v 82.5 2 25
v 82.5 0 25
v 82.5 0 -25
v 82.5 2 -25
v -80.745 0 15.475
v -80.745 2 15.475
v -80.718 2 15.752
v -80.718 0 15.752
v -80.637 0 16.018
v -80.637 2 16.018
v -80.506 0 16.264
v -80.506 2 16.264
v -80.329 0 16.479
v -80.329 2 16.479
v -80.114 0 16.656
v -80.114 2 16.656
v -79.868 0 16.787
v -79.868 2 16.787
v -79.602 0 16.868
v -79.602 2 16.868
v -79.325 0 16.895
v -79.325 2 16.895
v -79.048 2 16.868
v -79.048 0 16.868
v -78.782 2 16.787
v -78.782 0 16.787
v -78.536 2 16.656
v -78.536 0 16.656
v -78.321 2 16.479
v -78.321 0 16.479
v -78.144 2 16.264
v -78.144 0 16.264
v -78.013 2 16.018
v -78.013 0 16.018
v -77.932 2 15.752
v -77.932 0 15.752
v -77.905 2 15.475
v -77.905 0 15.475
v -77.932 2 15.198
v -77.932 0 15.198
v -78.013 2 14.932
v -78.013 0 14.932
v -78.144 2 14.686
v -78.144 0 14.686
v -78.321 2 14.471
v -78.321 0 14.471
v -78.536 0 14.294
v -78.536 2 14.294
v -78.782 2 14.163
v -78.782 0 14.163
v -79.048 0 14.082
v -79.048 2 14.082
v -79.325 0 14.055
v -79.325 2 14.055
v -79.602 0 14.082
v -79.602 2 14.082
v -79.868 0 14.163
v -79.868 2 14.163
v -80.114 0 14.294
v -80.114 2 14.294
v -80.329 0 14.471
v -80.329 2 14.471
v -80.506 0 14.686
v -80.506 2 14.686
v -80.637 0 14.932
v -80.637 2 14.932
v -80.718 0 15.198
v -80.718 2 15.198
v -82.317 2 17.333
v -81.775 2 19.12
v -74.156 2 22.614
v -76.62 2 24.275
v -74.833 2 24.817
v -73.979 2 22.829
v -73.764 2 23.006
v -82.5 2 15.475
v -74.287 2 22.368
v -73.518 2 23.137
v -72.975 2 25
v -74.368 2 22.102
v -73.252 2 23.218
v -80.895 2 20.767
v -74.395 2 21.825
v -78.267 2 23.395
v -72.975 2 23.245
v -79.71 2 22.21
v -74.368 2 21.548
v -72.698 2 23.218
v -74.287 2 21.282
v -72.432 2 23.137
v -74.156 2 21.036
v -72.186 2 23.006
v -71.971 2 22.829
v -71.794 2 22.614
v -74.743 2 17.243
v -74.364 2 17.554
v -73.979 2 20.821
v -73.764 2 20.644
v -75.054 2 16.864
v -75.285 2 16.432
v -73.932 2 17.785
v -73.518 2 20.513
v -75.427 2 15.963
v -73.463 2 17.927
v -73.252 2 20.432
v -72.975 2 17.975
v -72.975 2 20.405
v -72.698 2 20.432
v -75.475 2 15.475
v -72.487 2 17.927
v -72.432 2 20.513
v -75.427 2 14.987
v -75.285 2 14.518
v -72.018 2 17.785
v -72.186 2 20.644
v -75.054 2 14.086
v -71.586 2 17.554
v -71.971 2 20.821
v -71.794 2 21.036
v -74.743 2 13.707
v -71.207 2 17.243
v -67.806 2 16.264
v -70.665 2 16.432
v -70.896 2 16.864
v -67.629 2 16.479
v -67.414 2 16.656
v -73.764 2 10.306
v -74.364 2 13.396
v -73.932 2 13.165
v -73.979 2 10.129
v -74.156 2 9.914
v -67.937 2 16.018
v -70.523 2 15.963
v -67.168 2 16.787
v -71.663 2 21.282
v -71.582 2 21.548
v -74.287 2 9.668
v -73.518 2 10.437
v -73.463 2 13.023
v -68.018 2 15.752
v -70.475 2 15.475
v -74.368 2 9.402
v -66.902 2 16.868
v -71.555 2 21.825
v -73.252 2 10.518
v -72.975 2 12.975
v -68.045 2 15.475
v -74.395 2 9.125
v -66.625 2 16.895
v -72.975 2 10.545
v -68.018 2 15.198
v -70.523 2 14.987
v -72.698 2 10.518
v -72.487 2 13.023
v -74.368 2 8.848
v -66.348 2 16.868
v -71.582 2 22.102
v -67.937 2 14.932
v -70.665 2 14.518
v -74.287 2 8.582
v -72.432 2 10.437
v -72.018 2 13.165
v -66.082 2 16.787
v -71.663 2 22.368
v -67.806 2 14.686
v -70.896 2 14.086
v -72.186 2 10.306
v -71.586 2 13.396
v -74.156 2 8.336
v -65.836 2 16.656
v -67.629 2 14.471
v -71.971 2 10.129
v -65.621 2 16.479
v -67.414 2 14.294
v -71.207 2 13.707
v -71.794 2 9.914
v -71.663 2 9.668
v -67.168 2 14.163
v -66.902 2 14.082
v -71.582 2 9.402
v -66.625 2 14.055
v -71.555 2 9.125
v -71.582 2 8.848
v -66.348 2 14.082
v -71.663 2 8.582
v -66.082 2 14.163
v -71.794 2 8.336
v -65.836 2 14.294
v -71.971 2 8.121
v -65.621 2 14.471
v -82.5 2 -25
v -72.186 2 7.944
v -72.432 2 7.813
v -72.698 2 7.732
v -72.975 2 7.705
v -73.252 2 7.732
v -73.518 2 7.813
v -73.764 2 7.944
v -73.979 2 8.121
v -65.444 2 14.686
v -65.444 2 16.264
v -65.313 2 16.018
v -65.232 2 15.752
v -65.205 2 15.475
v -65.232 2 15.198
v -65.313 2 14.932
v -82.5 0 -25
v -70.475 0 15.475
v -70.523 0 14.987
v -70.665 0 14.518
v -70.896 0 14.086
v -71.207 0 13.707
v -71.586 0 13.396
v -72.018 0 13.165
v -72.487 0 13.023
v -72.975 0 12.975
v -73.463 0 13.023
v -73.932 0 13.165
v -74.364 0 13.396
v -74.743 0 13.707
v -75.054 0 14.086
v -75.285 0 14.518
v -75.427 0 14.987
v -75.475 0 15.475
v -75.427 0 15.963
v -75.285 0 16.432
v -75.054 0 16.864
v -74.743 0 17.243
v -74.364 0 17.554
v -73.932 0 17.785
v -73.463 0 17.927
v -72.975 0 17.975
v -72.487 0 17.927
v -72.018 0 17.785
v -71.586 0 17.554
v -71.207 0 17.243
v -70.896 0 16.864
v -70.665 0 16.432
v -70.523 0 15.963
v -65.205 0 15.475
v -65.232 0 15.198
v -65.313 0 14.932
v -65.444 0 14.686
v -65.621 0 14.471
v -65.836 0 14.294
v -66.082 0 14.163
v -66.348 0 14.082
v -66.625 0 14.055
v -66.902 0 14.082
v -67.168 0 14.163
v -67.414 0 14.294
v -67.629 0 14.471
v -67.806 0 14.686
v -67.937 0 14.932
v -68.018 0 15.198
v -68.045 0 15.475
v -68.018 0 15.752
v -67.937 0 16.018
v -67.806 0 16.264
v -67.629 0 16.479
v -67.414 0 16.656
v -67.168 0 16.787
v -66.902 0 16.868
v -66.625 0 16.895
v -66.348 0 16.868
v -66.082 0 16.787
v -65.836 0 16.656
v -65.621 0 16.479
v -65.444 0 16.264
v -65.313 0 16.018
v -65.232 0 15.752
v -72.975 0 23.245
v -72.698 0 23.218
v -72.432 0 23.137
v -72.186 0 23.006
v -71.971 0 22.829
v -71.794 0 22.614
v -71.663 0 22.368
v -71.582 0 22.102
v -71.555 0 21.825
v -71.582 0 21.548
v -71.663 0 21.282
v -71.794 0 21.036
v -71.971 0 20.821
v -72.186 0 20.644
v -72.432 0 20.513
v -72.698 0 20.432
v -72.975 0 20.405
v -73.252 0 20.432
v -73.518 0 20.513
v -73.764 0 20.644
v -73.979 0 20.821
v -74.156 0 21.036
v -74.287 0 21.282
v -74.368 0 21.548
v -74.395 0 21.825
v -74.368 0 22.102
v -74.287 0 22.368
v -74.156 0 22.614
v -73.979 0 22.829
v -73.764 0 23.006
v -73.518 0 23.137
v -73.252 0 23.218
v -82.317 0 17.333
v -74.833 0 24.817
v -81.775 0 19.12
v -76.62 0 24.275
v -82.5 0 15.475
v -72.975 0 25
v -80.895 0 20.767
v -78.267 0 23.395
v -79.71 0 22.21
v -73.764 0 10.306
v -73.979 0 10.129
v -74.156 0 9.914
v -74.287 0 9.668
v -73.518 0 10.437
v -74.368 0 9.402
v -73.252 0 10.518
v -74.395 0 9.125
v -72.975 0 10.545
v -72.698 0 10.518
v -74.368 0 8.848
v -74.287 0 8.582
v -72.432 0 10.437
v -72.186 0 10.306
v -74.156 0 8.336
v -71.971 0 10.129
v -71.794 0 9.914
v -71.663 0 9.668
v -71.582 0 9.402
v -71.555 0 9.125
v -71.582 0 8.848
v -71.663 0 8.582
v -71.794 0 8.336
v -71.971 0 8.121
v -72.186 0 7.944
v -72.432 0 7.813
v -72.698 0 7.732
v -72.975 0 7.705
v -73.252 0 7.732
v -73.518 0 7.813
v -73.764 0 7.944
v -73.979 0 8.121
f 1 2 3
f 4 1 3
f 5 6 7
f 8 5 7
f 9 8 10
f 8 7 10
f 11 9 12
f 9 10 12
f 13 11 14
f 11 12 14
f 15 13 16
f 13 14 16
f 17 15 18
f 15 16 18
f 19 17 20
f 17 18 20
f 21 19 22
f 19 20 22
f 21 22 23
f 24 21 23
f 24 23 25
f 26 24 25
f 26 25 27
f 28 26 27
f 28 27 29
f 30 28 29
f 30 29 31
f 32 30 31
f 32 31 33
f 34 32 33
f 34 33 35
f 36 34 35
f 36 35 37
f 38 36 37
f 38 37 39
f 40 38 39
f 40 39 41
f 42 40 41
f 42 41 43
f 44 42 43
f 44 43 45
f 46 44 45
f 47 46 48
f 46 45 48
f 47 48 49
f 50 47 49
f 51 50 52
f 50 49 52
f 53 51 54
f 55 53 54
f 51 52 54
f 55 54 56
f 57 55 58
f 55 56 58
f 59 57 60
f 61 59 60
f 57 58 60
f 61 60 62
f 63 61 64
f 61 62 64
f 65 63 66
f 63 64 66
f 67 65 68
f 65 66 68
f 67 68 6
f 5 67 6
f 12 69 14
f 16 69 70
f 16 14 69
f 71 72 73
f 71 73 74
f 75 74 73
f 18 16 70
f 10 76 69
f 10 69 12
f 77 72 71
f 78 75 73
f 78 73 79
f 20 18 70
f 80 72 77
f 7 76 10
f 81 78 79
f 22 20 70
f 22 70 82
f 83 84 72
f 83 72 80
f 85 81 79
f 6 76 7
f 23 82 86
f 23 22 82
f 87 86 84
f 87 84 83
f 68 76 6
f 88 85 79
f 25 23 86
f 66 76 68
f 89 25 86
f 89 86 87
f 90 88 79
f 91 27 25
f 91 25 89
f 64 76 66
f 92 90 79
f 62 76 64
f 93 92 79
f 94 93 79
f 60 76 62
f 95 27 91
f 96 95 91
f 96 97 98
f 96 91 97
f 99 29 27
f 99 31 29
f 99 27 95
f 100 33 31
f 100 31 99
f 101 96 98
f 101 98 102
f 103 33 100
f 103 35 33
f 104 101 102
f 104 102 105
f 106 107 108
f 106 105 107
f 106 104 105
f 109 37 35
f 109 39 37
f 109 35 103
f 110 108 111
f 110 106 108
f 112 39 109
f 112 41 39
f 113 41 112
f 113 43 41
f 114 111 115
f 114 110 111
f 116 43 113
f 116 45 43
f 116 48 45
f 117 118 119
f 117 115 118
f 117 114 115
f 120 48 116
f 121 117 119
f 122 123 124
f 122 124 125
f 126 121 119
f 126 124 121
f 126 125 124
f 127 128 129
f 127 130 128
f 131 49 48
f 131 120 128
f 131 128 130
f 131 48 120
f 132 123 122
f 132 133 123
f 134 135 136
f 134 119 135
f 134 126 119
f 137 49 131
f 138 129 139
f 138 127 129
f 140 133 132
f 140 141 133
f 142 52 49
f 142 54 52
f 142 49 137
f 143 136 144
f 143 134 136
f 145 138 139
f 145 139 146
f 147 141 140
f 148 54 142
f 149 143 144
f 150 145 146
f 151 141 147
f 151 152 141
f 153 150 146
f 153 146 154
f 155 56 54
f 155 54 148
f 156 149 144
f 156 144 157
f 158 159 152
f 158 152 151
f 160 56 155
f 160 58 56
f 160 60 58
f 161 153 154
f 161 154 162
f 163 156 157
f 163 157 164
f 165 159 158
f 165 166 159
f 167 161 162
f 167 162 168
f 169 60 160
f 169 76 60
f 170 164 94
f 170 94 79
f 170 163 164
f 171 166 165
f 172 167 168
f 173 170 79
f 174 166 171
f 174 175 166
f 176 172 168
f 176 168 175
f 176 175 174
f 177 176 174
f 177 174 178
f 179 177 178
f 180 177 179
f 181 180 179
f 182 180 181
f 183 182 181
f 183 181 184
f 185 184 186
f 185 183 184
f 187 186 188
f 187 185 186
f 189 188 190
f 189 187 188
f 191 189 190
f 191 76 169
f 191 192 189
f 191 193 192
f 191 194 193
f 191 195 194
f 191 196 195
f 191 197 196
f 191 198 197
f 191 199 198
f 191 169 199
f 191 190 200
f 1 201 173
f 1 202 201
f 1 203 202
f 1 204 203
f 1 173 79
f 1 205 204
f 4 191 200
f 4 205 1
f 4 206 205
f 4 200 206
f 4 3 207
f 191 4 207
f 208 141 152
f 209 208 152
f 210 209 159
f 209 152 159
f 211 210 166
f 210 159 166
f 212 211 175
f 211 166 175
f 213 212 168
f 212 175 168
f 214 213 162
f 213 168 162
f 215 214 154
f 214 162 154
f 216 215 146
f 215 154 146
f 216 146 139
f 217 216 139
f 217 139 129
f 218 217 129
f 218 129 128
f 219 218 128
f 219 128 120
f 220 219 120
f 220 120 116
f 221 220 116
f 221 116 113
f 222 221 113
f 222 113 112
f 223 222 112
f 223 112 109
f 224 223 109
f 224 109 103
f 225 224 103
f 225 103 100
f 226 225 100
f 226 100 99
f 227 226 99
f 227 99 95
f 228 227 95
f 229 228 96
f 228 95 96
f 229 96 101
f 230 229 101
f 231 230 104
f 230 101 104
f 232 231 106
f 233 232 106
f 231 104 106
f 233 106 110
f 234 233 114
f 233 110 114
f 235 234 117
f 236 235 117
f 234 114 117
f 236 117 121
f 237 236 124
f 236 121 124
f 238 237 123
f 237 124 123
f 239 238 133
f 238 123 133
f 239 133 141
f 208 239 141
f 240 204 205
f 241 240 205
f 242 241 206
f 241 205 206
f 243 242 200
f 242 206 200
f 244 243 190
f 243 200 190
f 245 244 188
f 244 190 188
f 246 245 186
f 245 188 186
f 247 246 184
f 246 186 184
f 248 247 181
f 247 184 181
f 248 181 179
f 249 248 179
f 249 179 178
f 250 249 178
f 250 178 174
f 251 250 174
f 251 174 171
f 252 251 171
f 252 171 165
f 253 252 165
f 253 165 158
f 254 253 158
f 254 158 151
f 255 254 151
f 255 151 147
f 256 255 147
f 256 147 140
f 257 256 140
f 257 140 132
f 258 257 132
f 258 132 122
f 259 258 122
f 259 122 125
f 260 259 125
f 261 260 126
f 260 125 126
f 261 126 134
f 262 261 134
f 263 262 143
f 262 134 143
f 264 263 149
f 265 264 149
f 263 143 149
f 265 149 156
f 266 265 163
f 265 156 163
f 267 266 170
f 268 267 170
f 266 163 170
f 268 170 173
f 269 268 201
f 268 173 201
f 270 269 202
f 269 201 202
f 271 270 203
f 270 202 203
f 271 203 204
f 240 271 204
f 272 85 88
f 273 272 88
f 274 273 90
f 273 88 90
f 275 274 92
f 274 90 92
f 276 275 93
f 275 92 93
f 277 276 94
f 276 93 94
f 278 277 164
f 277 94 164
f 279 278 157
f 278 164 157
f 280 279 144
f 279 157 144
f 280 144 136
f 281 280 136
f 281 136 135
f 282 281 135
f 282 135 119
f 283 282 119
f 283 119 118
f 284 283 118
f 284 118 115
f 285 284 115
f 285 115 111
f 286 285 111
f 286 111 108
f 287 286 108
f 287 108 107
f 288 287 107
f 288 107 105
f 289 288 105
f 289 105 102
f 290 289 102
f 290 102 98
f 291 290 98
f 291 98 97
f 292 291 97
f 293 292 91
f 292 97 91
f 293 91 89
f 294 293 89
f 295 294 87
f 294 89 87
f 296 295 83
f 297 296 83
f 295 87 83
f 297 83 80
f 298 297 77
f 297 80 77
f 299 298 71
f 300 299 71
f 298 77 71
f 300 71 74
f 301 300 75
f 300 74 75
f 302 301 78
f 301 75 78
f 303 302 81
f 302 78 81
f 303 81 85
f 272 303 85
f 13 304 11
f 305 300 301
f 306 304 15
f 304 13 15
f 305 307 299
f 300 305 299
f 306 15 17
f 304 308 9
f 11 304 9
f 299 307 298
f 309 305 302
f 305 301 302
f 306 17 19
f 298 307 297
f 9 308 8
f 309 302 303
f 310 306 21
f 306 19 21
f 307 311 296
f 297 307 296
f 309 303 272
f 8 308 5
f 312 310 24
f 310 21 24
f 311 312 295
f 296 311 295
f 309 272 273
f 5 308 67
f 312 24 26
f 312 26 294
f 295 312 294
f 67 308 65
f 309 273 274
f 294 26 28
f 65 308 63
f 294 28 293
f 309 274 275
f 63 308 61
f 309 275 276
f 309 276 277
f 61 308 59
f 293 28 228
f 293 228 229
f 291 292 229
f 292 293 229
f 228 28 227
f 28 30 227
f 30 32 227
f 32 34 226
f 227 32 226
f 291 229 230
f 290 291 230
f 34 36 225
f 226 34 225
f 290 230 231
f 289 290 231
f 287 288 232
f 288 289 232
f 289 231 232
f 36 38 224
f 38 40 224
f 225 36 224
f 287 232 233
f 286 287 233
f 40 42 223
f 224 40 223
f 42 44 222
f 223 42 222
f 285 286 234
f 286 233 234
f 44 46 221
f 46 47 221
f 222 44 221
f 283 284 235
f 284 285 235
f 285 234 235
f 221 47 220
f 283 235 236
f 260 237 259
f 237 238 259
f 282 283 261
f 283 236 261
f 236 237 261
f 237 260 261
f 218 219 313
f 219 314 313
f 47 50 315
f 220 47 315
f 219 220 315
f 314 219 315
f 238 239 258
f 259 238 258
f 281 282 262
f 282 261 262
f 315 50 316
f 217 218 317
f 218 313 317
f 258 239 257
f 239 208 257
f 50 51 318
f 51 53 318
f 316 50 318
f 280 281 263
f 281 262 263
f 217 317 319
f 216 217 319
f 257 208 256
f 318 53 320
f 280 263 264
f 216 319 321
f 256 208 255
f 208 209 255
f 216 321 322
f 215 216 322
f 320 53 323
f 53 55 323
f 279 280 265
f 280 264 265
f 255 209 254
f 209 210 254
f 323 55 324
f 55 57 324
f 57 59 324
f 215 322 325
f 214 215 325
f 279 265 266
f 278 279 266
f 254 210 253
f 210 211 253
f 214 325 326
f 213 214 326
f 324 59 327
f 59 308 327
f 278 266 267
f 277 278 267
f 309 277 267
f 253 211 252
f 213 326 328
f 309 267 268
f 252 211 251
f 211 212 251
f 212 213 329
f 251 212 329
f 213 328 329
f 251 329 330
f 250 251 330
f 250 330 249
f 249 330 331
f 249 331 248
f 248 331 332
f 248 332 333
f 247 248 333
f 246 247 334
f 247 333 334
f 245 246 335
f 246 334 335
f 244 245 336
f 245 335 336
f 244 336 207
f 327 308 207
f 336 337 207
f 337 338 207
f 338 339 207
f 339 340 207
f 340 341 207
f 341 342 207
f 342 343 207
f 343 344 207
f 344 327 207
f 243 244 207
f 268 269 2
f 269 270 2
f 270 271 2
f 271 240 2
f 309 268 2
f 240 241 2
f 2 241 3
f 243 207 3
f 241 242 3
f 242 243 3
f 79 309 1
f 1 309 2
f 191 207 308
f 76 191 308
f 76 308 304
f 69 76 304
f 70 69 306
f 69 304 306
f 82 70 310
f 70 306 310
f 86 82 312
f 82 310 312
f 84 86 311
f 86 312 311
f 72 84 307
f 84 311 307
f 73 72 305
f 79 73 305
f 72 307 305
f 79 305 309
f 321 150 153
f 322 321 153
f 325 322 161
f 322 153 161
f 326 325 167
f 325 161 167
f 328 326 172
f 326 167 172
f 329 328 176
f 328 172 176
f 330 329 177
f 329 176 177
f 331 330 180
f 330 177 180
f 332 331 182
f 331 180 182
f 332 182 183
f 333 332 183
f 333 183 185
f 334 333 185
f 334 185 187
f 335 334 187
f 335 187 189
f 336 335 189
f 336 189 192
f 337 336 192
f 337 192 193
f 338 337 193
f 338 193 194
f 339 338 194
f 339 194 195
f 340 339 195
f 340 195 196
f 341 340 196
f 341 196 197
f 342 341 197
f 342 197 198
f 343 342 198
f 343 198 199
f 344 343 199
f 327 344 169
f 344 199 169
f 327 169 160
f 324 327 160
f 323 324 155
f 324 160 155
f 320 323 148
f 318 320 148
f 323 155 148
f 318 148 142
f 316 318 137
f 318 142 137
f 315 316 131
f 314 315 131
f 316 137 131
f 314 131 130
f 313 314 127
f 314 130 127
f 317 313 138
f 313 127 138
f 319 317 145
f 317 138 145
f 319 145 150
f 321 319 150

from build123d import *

# Parameters (mm, degrees)
BOSS_EXTRUDE1_DEPTH = 2
SKETCH2_R           = 1.42
CUT_EXTRUDE2_DEPTH  = 6.35


with BuildPart() as part:
    # Sketch1 → Boss-Extrude1 (new body)
    with BuildSketch(Plane(origin=(0, 0, 0), x_dir=(1, 0, 0), z_dir=(0, 1, 0))):
        with BuildLine():
            Line((-82.5, 25), (-82.5, -15.475))
            ThreePointArc((-82.5, -15.475), (-79.710192091, -22.210192091), (-72.975, -25))
            Line((-72.975, -25), (82.5, -25))
            Line((82.5, -25), (82.5, 25))
            Line((82.5, 25), (-82.5, 25))
        make_face()
    extrude(amount=BOSS_EXTRUDE1_DEPTH)

    # Sketch2 → Cut-Extrude2 (cut)
    with BuildSketch(Plane(origin=(0, 2, 0), x_dir=(1, 0, 0), z_dir=(0, 1, 0))):
        with BuildLine():
            ThreePointArc((-68.045, -15.475), (-66.625, -16.895), (-65.205, -15.475))
            Line((-65.205, -15.475), (-68.045, -15.475))
        make_face()
        with BuildLine():
            Line((-68.045, -15.475), (-65.205, -15.475))
            ThreePointArc((-65.205, -15.475), (-66.625, -14.055), (-68.045, -15.475))
        make_face()
        with Locations(Location((-72.975, -9.125, 0), (0, 0, 270))):
            Circle(SKETCH2_R)
        with BuildLine():
            ThreePointArc((-77.905, -15.475), (-79.325, -14.055), (-80.745, -15.475))
            Line((-80.745, -15.475), (-77.905, -15.475))
        make_face()
        with BuildLine():
            Line((-77.905, -15.475), (-80.745, -15.475))
            ThreePointArc((-80.745, -15.475), (-79.325, -16.895), (-77.905, -15.475))
        make_face()
        with Locations(Location((-72.975, -21.825, 0), (0, 0, 270))):
            Circle(SKETCH2_R)
        with BuildLine():
            ThreePointArc((-75.475, -15.475), (-72.975, -17.975), (-70.475, -15.475))
            Line((-70.475, -15.475), (-75.475, -15.475))
        make_face()
        with BuildLine():
            Line((-75.475, -15.475), (-70.475, -15.475))
            ThreePointArc((-70.475, -15.475), (-72.975, -12.975), (-75.475, -15.475))
        make_face()
    extrude(amount=-CUT_EXTRUDE2_DEPTH, mode=Mode.SUBTRACT)


solid = part.part
